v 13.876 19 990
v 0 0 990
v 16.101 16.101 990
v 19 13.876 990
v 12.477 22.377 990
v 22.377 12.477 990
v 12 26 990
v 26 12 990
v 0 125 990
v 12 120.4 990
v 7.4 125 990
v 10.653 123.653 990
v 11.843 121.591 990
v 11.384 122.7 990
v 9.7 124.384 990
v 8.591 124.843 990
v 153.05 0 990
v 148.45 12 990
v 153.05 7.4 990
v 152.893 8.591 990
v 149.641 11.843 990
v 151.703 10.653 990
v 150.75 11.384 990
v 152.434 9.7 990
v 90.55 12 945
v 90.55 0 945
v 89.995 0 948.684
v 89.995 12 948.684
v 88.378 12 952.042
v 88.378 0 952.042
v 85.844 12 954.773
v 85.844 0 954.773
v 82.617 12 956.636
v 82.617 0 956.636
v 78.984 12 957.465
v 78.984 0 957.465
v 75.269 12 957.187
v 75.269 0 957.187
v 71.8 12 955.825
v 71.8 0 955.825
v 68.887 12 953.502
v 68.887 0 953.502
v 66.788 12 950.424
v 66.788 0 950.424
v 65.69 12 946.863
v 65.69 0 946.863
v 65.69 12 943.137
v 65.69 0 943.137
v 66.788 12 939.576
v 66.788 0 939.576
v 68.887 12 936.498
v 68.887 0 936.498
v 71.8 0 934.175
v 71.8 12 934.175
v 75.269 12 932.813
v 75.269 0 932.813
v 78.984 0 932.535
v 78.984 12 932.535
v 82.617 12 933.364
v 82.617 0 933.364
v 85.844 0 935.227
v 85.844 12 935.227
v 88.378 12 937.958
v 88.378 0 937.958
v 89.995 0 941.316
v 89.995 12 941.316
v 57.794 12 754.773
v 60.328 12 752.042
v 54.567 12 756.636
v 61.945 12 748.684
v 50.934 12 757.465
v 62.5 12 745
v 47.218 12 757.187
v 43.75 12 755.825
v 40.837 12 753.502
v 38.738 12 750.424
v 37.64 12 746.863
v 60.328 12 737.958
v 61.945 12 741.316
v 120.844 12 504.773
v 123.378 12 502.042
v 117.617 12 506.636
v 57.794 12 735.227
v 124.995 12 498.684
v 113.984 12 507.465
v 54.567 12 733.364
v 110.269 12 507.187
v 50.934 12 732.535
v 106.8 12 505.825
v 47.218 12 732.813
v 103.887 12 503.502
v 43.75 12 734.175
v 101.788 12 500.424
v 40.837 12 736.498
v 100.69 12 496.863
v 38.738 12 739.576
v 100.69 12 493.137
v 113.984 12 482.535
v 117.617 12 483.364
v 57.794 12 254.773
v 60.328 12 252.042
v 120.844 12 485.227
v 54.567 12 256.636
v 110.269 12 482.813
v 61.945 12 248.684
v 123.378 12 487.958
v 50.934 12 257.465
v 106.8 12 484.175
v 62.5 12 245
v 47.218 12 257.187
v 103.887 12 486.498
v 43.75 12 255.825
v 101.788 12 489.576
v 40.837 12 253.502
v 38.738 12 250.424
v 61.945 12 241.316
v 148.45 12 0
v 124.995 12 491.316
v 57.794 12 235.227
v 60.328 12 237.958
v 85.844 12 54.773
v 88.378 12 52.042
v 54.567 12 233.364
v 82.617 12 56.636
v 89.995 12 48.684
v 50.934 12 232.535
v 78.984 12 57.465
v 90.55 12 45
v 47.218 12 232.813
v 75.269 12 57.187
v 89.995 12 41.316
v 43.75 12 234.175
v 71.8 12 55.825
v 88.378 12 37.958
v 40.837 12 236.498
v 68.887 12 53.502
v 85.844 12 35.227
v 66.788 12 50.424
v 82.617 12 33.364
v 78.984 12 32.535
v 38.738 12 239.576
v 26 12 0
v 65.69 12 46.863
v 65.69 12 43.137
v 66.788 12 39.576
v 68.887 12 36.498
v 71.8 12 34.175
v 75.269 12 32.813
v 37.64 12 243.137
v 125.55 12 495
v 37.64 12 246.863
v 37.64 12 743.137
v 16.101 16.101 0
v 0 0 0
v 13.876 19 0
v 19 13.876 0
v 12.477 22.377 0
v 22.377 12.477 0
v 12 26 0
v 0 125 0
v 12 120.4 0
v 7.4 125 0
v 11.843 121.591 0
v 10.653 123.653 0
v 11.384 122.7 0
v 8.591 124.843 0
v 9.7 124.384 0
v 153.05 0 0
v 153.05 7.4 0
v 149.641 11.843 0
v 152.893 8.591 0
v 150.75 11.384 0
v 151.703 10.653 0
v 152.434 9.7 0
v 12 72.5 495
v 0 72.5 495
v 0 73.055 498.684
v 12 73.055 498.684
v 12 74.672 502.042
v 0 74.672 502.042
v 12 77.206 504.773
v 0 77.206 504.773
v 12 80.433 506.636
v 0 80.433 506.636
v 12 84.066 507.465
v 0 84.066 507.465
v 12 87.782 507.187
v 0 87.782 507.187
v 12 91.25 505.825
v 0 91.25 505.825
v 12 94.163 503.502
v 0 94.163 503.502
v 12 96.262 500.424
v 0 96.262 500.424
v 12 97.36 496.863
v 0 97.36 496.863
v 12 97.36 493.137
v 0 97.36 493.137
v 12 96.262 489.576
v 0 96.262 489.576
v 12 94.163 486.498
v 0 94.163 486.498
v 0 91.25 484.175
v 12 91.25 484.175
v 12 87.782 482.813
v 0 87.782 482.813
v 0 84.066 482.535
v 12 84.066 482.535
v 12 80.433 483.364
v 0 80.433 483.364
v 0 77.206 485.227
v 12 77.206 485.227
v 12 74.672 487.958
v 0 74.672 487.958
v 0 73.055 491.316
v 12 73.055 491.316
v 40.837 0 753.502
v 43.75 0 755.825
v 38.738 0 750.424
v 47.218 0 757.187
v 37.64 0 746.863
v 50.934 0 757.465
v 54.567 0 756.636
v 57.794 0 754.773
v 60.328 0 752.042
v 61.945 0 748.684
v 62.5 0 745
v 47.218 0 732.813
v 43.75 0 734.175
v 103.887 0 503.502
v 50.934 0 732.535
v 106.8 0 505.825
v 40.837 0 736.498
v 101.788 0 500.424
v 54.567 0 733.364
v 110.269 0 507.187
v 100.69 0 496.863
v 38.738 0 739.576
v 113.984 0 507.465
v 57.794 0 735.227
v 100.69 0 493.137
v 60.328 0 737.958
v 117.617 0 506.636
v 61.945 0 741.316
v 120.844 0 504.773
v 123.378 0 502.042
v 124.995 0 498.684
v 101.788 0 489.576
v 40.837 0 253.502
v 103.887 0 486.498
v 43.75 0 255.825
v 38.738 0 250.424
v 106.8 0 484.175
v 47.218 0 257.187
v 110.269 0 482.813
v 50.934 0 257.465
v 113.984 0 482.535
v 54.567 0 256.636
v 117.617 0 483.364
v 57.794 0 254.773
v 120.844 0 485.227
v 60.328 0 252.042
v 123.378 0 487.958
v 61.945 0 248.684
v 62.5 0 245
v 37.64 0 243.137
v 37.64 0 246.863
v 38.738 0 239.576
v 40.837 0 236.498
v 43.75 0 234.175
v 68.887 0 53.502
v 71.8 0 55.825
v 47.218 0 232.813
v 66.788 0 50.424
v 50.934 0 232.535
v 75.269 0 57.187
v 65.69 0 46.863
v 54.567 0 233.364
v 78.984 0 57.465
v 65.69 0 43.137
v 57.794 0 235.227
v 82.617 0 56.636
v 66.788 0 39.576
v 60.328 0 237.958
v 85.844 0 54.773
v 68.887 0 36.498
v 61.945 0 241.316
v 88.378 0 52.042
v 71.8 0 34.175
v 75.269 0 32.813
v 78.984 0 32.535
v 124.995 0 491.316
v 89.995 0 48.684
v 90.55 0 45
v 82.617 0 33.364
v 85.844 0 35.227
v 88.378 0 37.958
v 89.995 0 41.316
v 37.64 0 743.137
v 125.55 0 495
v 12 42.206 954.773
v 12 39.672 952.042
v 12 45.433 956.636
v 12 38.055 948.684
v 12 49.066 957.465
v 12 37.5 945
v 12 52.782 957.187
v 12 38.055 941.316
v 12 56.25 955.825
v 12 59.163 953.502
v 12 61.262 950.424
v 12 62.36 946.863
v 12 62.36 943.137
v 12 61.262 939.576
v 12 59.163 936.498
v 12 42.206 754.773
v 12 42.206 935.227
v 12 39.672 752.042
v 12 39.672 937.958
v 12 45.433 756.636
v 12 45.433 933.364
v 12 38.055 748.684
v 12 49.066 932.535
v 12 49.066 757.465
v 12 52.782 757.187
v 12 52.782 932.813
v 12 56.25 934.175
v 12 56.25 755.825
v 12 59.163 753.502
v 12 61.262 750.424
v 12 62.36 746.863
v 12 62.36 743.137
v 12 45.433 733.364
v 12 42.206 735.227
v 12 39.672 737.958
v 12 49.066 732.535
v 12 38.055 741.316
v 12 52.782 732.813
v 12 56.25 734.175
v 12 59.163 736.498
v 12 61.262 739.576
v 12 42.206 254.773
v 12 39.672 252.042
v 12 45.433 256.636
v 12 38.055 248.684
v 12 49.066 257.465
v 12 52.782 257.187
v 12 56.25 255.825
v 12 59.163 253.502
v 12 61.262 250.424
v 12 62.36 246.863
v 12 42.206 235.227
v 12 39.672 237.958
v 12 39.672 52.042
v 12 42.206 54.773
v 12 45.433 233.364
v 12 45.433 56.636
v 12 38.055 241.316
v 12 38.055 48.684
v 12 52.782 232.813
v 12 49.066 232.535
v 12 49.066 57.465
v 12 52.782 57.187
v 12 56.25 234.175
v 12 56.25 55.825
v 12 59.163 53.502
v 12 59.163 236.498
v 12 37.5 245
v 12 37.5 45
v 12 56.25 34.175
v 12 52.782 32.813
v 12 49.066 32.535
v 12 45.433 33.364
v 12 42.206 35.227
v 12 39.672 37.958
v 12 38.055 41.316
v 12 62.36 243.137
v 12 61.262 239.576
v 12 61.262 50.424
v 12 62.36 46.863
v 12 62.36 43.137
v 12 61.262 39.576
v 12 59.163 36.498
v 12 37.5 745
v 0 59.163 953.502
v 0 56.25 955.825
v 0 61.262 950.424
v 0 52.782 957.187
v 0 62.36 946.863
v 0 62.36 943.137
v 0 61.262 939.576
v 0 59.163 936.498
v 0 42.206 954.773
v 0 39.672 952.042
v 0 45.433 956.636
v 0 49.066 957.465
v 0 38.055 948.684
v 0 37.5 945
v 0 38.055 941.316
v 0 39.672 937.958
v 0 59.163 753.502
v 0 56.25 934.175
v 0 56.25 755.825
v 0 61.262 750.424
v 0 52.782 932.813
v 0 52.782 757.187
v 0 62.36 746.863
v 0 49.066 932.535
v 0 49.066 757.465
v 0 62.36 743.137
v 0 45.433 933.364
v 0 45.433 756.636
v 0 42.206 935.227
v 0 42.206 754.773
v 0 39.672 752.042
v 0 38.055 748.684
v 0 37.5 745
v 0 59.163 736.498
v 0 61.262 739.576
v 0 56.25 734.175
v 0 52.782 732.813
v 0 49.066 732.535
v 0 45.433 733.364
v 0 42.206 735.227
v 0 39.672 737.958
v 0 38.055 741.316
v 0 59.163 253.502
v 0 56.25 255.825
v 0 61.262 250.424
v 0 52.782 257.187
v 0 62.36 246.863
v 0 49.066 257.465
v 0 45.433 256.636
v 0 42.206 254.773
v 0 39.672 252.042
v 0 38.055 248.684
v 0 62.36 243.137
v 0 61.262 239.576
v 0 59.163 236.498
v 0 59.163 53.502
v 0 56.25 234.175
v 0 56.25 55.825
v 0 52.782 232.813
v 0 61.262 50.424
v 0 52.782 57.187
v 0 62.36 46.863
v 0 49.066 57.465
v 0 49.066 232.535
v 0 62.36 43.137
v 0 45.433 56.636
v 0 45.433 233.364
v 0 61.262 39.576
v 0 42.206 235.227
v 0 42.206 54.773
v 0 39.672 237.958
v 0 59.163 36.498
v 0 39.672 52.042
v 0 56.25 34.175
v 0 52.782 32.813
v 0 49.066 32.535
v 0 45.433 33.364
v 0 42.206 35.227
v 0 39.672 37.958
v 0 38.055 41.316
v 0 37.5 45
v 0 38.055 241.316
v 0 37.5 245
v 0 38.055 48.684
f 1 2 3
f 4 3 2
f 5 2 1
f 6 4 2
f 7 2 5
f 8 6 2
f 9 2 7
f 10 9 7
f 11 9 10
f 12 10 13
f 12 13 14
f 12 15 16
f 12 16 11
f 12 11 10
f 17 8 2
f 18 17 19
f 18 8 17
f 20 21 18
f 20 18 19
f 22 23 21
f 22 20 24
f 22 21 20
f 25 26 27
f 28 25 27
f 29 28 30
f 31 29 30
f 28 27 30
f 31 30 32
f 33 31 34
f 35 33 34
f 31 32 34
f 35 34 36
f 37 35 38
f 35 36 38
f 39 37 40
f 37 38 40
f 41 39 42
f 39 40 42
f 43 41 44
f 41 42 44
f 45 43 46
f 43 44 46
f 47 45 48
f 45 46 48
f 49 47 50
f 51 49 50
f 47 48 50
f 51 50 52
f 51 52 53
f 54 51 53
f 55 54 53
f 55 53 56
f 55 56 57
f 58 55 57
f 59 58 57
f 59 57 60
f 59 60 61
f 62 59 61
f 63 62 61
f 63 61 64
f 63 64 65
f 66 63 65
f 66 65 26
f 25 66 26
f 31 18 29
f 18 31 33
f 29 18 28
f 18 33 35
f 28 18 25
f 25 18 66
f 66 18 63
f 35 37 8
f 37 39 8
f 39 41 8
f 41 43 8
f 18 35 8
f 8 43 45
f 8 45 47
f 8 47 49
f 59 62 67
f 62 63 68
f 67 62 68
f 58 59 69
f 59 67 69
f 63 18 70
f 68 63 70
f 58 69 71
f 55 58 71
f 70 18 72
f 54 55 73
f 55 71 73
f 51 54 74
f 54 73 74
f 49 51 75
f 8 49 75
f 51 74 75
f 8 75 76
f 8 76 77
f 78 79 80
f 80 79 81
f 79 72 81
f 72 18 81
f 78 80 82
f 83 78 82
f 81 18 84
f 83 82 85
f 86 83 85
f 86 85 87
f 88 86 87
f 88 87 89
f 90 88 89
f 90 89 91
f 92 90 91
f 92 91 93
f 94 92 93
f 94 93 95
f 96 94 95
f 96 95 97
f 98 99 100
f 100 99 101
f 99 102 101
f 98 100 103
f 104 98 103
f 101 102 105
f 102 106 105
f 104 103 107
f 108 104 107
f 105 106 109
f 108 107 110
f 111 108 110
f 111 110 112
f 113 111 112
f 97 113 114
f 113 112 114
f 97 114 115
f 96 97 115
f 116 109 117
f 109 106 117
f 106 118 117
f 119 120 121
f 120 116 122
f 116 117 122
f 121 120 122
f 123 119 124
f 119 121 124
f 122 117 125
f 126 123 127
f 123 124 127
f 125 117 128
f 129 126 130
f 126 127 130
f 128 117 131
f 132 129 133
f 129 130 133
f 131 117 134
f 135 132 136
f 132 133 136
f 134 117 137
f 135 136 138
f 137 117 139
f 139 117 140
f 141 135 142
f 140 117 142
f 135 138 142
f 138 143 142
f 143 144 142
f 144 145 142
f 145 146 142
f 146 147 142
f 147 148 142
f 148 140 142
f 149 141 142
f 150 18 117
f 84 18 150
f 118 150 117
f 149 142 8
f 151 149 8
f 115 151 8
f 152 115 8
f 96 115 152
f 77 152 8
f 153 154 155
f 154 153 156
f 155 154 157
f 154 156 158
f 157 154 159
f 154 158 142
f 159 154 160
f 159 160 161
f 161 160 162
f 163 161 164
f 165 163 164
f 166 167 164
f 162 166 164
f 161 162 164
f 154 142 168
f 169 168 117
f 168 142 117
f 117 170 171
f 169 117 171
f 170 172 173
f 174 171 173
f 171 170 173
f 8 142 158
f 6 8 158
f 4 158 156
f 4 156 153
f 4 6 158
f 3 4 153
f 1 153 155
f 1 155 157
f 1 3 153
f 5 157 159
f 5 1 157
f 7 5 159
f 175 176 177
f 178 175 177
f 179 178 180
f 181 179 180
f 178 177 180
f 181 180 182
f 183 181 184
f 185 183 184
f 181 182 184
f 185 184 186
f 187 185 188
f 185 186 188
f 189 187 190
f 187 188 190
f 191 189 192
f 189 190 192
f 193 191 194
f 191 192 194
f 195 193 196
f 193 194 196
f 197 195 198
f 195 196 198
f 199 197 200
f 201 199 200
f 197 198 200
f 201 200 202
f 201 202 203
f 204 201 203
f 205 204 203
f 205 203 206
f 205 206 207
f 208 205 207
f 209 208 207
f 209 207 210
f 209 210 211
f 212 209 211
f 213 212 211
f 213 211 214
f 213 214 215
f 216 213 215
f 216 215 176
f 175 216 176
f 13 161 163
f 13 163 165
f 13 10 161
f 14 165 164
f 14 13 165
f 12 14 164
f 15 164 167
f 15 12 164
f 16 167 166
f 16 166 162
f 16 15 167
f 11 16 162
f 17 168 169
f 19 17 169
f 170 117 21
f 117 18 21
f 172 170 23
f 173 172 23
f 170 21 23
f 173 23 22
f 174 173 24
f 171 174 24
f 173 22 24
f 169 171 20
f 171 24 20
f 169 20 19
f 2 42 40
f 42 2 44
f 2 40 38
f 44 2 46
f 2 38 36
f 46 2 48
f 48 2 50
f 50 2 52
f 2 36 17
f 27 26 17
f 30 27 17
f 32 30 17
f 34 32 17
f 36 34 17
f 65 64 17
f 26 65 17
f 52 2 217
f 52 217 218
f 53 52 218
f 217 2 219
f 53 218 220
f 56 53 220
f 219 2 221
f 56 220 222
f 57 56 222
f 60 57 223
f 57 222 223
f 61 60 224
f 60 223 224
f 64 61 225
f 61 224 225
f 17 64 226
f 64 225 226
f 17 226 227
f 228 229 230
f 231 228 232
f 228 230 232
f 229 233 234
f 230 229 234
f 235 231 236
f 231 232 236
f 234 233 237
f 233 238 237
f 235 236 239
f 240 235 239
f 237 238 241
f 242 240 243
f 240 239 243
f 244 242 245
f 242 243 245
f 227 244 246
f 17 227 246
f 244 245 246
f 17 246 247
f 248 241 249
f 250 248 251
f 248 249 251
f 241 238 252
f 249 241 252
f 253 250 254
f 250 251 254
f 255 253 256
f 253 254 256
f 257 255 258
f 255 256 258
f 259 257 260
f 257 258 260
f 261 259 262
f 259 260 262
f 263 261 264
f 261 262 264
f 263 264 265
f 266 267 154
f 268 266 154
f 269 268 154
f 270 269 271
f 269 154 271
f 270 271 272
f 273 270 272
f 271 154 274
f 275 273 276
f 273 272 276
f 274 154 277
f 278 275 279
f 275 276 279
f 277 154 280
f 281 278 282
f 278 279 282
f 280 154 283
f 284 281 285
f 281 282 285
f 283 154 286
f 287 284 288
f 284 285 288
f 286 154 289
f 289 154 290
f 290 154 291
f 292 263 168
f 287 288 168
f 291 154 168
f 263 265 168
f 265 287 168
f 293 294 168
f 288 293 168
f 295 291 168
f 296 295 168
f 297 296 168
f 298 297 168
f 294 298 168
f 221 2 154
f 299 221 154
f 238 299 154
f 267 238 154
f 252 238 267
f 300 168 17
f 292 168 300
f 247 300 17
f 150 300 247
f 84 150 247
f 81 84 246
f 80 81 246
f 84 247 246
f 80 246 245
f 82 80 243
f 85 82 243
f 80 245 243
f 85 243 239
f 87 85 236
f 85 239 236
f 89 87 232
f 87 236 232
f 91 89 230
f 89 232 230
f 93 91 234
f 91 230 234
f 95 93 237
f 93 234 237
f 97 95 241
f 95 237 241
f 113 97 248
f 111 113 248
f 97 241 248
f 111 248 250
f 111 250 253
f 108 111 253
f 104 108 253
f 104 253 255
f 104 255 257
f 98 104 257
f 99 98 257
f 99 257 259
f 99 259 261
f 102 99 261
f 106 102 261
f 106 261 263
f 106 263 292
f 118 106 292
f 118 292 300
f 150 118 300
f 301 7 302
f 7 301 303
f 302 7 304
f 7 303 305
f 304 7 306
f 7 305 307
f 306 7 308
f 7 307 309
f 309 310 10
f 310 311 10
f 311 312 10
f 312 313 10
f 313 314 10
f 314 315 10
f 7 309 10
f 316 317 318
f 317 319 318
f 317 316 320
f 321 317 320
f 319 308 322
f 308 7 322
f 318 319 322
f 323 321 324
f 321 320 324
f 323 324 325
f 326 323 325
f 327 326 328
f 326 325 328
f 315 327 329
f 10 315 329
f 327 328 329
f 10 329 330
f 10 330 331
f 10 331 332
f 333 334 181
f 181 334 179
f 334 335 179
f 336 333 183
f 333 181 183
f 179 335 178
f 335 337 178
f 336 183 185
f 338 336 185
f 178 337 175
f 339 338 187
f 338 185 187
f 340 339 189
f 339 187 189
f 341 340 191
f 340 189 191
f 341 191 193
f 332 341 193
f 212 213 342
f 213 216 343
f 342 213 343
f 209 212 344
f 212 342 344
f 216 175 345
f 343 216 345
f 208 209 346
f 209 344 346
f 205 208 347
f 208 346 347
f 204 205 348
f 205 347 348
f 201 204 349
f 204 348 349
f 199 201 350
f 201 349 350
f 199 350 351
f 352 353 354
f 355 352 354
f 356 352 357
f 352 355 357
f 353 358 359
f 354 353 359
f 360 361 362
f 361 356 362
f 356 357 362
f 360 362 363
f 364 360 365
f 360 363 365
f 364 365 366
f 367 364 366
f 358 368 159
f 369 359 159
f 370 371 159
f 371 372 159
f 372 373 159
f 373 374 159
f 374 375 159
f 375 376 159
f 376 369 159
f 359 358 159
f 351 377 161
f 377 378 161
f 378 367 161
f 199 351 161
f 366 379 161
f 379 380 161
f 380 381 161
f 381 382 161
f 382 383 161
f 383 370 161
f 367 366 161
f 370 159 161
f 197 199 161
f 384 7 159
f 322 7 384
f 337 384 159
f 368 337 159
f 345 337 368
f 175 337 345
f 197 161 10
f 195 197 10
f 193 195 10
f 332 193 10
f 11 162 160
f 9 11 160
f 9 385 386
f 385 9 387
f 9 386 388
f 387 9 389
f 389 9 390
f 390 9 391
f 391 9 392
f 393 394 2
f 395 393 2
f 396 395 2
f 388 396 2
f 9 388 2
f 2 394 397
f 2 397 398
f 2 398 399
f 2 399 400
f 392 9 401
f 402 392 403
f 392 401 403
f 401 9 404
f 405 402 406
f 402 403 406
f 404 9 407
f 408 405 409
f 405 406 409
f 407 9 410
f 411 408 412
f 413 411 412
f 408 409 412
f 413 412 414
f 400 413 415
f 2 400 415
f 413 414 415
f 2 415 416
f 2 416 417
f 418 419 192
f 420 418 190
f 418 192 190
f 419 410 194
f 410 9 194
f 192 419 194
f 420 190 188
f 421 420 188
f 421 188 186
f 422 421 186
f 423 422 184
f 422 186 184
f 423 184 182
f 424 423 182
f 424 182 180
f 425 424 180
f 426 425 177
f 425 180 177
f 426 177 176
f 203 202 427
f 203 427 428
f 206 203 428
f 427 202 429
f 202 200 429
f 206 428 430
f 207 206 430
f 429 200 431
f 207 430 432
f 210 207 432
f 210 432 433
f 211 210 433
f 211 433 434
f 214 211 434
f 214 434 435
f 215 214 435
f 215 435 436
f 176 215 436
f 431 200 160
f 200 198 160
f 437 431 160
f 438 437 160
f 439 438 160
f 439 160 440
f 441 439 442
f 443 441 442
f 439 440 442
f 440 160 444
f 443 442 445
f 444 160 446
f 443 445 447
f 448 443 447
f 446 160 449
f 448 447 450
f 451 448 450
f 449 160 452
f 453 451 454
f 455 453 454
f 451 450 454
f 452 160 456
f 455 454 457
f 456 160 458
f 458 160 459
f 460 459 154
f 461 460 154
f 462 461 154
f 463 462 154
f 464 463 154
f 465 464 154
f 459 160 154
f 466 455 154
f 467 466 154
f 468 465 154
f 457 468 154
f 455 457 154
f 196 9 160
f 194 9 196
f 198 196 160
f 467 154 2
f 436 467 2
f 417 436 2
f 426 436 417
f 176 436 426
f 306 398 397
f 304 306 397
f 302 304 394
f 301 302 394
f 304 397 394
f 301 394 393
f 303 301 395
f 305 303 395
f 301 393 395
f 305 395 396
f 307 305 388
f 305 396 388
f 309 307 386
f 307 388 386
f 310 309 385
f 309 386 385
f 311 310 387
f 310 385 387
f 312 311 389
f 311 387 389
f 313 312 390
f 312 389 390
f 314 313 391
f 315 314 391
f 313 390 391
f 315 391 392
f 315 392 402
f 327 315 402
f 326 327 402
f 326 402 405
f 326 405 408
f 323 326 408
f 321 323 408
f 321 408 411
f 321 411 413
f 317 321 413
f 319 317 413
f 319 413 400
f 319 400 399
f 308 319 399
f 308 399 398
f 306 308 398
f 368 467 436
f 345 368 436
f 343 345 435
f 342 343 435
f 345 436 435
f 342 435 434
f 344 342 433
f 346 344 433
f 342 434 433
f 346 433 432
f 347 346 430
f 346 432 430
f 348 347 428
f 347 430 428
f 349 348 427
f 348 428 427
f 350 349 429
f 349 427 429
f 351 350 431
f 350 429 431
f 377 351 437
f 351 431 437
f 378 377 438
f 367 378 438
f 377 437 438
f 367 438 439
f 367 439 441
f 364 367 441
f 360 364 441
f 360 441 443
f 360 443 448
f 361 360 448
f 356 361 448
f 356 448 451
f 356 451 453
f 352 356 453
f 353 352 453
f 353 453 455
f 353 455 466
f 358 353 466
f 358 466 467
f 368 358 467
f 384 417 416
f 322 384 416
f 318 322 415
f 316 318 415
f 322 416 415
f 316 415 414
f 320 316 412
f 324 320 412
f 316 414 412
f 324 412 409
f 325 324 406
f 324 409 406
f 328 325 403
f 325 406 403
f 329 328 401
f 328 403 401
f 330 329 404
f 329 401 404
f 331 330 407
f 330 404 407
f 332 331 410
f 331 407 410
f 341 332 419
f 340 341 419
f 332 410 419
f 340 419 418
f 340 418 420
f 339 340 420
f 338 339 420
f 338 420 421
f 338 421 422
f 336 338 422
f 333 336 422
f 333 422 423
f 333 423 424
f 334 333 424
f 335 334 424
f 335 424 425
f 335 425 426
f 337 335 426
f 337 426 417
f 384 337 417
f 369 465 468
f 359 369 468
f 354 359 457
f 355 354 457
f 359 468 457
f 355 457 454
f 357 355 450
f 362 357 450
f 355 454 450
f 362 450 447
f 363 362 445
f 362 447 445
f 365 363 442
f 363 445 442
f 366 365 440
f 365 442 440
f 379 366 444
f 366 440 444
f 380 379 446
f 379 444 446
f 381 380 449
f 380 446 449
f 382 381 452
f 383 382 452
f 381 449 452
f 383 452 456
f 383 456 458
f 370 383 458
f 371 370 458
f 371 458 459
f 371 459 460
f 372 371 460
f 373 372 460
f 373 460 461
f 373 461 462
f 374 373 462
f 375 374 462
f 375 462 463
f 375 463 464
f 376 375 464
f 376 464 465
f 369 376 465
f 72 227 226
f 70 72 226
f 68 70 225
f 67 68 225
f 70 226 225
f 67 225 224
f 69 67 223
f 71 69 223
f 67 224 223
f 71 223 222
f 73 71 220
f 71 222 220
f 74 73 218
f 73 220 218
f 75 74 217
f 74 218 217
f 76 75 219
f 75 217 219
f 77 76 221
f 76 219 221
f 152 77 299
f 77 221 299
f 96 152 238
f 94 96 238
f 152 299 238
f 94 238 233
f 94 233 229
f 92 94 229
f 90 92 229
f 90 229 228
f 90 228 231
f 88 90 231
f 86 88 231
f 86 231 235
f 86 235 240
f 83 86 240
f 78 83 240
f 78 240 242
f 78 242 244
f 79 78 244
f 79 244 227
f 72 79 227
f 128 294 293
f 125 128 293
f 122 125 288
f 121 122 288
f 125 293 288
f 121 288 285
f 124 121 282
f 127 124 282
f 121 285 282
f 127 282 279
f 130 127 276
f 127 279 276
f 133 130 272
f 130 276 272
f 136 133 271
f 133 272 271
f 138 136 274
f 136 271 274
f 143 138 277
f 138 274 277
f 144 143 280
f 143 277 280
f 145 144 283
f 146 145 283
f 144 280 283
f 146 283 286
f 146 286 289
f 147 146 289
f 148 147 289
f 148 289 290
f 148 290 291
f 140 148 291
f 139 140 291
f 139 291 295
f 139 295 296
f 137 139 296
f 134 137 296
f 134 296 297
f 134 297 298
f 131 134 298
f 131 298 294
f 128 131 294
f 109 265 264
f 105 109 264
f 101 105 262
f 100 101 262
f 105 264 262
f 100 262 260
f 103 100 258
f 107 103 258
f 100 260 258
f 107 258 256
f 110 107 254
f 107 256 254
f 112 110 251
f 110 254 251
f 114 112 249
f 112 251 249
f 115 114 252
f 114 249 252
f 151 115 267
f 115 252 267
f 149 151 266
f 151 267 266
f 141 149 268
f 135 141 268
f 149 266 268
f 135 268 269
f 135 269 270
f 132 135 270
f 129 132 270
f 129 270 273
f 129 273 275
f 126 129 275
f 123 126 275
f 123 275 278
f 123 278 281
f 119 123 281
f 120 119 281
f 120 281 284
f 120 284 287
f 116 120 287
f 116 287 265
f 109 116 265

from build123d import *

# Parameters (mm, degrees)
F1_DEPTH = 990
F2_R     = 14
F3_R     = 4.6
F5_D     = 25
F7_D     = 25
F9_D     = 25


with BuildPart() as f1:
    # F0 (on Top) → F1 (new body)
    with BuildSketch(Plane.XY):
        Polygon((0, 125), (0, 0), (153.050105, 0), (153.050105, 12), (12, 12), (12, 125), align=None)
    extrude(amount=F1_DEPTH)

    # F2
    f2_edges = [f1.edges().sort_by_distance(p)[0] for p in [
        (12, 12, 495),
    ]]
    fillet(f2_edges, radius=F2_R)

    # F3
    f3_edges = [f1.edges().sort_by_distance(p)[0] for p in [
        (12, 125, 495),
        (153.050105, 12, 495),
    ]]
    fillet(f3_edges, radius=F3_R)

    # F5 (through all)
    with Locations(Plane(origin=(0, 12, 0), x_dir=(-1, 0, 0), z_dir=(0, 1, 0))):
        with Locations((-113.050105, 495)):
            Hole(F5_D / 2)

    # F7 (through all)
    with Locations(Plane(origin=(0, 12, 0), x_dir=(-1, 0, 0), z_dir=(0, 1, 0))):
        with Locations((-78.050105, 945), (-50, 745), (-50, 245), (-78.050105, 45)):
            Hole(F7_D / 2)

    # F9 (through all)
    with Locations(Plane.YZ.offset(12)):
        with Locations((50, 945), (50, 745), (85, 495), (50, 245), (50, 45)):
            Hole(F9_D / 2)


solid = f1.part
